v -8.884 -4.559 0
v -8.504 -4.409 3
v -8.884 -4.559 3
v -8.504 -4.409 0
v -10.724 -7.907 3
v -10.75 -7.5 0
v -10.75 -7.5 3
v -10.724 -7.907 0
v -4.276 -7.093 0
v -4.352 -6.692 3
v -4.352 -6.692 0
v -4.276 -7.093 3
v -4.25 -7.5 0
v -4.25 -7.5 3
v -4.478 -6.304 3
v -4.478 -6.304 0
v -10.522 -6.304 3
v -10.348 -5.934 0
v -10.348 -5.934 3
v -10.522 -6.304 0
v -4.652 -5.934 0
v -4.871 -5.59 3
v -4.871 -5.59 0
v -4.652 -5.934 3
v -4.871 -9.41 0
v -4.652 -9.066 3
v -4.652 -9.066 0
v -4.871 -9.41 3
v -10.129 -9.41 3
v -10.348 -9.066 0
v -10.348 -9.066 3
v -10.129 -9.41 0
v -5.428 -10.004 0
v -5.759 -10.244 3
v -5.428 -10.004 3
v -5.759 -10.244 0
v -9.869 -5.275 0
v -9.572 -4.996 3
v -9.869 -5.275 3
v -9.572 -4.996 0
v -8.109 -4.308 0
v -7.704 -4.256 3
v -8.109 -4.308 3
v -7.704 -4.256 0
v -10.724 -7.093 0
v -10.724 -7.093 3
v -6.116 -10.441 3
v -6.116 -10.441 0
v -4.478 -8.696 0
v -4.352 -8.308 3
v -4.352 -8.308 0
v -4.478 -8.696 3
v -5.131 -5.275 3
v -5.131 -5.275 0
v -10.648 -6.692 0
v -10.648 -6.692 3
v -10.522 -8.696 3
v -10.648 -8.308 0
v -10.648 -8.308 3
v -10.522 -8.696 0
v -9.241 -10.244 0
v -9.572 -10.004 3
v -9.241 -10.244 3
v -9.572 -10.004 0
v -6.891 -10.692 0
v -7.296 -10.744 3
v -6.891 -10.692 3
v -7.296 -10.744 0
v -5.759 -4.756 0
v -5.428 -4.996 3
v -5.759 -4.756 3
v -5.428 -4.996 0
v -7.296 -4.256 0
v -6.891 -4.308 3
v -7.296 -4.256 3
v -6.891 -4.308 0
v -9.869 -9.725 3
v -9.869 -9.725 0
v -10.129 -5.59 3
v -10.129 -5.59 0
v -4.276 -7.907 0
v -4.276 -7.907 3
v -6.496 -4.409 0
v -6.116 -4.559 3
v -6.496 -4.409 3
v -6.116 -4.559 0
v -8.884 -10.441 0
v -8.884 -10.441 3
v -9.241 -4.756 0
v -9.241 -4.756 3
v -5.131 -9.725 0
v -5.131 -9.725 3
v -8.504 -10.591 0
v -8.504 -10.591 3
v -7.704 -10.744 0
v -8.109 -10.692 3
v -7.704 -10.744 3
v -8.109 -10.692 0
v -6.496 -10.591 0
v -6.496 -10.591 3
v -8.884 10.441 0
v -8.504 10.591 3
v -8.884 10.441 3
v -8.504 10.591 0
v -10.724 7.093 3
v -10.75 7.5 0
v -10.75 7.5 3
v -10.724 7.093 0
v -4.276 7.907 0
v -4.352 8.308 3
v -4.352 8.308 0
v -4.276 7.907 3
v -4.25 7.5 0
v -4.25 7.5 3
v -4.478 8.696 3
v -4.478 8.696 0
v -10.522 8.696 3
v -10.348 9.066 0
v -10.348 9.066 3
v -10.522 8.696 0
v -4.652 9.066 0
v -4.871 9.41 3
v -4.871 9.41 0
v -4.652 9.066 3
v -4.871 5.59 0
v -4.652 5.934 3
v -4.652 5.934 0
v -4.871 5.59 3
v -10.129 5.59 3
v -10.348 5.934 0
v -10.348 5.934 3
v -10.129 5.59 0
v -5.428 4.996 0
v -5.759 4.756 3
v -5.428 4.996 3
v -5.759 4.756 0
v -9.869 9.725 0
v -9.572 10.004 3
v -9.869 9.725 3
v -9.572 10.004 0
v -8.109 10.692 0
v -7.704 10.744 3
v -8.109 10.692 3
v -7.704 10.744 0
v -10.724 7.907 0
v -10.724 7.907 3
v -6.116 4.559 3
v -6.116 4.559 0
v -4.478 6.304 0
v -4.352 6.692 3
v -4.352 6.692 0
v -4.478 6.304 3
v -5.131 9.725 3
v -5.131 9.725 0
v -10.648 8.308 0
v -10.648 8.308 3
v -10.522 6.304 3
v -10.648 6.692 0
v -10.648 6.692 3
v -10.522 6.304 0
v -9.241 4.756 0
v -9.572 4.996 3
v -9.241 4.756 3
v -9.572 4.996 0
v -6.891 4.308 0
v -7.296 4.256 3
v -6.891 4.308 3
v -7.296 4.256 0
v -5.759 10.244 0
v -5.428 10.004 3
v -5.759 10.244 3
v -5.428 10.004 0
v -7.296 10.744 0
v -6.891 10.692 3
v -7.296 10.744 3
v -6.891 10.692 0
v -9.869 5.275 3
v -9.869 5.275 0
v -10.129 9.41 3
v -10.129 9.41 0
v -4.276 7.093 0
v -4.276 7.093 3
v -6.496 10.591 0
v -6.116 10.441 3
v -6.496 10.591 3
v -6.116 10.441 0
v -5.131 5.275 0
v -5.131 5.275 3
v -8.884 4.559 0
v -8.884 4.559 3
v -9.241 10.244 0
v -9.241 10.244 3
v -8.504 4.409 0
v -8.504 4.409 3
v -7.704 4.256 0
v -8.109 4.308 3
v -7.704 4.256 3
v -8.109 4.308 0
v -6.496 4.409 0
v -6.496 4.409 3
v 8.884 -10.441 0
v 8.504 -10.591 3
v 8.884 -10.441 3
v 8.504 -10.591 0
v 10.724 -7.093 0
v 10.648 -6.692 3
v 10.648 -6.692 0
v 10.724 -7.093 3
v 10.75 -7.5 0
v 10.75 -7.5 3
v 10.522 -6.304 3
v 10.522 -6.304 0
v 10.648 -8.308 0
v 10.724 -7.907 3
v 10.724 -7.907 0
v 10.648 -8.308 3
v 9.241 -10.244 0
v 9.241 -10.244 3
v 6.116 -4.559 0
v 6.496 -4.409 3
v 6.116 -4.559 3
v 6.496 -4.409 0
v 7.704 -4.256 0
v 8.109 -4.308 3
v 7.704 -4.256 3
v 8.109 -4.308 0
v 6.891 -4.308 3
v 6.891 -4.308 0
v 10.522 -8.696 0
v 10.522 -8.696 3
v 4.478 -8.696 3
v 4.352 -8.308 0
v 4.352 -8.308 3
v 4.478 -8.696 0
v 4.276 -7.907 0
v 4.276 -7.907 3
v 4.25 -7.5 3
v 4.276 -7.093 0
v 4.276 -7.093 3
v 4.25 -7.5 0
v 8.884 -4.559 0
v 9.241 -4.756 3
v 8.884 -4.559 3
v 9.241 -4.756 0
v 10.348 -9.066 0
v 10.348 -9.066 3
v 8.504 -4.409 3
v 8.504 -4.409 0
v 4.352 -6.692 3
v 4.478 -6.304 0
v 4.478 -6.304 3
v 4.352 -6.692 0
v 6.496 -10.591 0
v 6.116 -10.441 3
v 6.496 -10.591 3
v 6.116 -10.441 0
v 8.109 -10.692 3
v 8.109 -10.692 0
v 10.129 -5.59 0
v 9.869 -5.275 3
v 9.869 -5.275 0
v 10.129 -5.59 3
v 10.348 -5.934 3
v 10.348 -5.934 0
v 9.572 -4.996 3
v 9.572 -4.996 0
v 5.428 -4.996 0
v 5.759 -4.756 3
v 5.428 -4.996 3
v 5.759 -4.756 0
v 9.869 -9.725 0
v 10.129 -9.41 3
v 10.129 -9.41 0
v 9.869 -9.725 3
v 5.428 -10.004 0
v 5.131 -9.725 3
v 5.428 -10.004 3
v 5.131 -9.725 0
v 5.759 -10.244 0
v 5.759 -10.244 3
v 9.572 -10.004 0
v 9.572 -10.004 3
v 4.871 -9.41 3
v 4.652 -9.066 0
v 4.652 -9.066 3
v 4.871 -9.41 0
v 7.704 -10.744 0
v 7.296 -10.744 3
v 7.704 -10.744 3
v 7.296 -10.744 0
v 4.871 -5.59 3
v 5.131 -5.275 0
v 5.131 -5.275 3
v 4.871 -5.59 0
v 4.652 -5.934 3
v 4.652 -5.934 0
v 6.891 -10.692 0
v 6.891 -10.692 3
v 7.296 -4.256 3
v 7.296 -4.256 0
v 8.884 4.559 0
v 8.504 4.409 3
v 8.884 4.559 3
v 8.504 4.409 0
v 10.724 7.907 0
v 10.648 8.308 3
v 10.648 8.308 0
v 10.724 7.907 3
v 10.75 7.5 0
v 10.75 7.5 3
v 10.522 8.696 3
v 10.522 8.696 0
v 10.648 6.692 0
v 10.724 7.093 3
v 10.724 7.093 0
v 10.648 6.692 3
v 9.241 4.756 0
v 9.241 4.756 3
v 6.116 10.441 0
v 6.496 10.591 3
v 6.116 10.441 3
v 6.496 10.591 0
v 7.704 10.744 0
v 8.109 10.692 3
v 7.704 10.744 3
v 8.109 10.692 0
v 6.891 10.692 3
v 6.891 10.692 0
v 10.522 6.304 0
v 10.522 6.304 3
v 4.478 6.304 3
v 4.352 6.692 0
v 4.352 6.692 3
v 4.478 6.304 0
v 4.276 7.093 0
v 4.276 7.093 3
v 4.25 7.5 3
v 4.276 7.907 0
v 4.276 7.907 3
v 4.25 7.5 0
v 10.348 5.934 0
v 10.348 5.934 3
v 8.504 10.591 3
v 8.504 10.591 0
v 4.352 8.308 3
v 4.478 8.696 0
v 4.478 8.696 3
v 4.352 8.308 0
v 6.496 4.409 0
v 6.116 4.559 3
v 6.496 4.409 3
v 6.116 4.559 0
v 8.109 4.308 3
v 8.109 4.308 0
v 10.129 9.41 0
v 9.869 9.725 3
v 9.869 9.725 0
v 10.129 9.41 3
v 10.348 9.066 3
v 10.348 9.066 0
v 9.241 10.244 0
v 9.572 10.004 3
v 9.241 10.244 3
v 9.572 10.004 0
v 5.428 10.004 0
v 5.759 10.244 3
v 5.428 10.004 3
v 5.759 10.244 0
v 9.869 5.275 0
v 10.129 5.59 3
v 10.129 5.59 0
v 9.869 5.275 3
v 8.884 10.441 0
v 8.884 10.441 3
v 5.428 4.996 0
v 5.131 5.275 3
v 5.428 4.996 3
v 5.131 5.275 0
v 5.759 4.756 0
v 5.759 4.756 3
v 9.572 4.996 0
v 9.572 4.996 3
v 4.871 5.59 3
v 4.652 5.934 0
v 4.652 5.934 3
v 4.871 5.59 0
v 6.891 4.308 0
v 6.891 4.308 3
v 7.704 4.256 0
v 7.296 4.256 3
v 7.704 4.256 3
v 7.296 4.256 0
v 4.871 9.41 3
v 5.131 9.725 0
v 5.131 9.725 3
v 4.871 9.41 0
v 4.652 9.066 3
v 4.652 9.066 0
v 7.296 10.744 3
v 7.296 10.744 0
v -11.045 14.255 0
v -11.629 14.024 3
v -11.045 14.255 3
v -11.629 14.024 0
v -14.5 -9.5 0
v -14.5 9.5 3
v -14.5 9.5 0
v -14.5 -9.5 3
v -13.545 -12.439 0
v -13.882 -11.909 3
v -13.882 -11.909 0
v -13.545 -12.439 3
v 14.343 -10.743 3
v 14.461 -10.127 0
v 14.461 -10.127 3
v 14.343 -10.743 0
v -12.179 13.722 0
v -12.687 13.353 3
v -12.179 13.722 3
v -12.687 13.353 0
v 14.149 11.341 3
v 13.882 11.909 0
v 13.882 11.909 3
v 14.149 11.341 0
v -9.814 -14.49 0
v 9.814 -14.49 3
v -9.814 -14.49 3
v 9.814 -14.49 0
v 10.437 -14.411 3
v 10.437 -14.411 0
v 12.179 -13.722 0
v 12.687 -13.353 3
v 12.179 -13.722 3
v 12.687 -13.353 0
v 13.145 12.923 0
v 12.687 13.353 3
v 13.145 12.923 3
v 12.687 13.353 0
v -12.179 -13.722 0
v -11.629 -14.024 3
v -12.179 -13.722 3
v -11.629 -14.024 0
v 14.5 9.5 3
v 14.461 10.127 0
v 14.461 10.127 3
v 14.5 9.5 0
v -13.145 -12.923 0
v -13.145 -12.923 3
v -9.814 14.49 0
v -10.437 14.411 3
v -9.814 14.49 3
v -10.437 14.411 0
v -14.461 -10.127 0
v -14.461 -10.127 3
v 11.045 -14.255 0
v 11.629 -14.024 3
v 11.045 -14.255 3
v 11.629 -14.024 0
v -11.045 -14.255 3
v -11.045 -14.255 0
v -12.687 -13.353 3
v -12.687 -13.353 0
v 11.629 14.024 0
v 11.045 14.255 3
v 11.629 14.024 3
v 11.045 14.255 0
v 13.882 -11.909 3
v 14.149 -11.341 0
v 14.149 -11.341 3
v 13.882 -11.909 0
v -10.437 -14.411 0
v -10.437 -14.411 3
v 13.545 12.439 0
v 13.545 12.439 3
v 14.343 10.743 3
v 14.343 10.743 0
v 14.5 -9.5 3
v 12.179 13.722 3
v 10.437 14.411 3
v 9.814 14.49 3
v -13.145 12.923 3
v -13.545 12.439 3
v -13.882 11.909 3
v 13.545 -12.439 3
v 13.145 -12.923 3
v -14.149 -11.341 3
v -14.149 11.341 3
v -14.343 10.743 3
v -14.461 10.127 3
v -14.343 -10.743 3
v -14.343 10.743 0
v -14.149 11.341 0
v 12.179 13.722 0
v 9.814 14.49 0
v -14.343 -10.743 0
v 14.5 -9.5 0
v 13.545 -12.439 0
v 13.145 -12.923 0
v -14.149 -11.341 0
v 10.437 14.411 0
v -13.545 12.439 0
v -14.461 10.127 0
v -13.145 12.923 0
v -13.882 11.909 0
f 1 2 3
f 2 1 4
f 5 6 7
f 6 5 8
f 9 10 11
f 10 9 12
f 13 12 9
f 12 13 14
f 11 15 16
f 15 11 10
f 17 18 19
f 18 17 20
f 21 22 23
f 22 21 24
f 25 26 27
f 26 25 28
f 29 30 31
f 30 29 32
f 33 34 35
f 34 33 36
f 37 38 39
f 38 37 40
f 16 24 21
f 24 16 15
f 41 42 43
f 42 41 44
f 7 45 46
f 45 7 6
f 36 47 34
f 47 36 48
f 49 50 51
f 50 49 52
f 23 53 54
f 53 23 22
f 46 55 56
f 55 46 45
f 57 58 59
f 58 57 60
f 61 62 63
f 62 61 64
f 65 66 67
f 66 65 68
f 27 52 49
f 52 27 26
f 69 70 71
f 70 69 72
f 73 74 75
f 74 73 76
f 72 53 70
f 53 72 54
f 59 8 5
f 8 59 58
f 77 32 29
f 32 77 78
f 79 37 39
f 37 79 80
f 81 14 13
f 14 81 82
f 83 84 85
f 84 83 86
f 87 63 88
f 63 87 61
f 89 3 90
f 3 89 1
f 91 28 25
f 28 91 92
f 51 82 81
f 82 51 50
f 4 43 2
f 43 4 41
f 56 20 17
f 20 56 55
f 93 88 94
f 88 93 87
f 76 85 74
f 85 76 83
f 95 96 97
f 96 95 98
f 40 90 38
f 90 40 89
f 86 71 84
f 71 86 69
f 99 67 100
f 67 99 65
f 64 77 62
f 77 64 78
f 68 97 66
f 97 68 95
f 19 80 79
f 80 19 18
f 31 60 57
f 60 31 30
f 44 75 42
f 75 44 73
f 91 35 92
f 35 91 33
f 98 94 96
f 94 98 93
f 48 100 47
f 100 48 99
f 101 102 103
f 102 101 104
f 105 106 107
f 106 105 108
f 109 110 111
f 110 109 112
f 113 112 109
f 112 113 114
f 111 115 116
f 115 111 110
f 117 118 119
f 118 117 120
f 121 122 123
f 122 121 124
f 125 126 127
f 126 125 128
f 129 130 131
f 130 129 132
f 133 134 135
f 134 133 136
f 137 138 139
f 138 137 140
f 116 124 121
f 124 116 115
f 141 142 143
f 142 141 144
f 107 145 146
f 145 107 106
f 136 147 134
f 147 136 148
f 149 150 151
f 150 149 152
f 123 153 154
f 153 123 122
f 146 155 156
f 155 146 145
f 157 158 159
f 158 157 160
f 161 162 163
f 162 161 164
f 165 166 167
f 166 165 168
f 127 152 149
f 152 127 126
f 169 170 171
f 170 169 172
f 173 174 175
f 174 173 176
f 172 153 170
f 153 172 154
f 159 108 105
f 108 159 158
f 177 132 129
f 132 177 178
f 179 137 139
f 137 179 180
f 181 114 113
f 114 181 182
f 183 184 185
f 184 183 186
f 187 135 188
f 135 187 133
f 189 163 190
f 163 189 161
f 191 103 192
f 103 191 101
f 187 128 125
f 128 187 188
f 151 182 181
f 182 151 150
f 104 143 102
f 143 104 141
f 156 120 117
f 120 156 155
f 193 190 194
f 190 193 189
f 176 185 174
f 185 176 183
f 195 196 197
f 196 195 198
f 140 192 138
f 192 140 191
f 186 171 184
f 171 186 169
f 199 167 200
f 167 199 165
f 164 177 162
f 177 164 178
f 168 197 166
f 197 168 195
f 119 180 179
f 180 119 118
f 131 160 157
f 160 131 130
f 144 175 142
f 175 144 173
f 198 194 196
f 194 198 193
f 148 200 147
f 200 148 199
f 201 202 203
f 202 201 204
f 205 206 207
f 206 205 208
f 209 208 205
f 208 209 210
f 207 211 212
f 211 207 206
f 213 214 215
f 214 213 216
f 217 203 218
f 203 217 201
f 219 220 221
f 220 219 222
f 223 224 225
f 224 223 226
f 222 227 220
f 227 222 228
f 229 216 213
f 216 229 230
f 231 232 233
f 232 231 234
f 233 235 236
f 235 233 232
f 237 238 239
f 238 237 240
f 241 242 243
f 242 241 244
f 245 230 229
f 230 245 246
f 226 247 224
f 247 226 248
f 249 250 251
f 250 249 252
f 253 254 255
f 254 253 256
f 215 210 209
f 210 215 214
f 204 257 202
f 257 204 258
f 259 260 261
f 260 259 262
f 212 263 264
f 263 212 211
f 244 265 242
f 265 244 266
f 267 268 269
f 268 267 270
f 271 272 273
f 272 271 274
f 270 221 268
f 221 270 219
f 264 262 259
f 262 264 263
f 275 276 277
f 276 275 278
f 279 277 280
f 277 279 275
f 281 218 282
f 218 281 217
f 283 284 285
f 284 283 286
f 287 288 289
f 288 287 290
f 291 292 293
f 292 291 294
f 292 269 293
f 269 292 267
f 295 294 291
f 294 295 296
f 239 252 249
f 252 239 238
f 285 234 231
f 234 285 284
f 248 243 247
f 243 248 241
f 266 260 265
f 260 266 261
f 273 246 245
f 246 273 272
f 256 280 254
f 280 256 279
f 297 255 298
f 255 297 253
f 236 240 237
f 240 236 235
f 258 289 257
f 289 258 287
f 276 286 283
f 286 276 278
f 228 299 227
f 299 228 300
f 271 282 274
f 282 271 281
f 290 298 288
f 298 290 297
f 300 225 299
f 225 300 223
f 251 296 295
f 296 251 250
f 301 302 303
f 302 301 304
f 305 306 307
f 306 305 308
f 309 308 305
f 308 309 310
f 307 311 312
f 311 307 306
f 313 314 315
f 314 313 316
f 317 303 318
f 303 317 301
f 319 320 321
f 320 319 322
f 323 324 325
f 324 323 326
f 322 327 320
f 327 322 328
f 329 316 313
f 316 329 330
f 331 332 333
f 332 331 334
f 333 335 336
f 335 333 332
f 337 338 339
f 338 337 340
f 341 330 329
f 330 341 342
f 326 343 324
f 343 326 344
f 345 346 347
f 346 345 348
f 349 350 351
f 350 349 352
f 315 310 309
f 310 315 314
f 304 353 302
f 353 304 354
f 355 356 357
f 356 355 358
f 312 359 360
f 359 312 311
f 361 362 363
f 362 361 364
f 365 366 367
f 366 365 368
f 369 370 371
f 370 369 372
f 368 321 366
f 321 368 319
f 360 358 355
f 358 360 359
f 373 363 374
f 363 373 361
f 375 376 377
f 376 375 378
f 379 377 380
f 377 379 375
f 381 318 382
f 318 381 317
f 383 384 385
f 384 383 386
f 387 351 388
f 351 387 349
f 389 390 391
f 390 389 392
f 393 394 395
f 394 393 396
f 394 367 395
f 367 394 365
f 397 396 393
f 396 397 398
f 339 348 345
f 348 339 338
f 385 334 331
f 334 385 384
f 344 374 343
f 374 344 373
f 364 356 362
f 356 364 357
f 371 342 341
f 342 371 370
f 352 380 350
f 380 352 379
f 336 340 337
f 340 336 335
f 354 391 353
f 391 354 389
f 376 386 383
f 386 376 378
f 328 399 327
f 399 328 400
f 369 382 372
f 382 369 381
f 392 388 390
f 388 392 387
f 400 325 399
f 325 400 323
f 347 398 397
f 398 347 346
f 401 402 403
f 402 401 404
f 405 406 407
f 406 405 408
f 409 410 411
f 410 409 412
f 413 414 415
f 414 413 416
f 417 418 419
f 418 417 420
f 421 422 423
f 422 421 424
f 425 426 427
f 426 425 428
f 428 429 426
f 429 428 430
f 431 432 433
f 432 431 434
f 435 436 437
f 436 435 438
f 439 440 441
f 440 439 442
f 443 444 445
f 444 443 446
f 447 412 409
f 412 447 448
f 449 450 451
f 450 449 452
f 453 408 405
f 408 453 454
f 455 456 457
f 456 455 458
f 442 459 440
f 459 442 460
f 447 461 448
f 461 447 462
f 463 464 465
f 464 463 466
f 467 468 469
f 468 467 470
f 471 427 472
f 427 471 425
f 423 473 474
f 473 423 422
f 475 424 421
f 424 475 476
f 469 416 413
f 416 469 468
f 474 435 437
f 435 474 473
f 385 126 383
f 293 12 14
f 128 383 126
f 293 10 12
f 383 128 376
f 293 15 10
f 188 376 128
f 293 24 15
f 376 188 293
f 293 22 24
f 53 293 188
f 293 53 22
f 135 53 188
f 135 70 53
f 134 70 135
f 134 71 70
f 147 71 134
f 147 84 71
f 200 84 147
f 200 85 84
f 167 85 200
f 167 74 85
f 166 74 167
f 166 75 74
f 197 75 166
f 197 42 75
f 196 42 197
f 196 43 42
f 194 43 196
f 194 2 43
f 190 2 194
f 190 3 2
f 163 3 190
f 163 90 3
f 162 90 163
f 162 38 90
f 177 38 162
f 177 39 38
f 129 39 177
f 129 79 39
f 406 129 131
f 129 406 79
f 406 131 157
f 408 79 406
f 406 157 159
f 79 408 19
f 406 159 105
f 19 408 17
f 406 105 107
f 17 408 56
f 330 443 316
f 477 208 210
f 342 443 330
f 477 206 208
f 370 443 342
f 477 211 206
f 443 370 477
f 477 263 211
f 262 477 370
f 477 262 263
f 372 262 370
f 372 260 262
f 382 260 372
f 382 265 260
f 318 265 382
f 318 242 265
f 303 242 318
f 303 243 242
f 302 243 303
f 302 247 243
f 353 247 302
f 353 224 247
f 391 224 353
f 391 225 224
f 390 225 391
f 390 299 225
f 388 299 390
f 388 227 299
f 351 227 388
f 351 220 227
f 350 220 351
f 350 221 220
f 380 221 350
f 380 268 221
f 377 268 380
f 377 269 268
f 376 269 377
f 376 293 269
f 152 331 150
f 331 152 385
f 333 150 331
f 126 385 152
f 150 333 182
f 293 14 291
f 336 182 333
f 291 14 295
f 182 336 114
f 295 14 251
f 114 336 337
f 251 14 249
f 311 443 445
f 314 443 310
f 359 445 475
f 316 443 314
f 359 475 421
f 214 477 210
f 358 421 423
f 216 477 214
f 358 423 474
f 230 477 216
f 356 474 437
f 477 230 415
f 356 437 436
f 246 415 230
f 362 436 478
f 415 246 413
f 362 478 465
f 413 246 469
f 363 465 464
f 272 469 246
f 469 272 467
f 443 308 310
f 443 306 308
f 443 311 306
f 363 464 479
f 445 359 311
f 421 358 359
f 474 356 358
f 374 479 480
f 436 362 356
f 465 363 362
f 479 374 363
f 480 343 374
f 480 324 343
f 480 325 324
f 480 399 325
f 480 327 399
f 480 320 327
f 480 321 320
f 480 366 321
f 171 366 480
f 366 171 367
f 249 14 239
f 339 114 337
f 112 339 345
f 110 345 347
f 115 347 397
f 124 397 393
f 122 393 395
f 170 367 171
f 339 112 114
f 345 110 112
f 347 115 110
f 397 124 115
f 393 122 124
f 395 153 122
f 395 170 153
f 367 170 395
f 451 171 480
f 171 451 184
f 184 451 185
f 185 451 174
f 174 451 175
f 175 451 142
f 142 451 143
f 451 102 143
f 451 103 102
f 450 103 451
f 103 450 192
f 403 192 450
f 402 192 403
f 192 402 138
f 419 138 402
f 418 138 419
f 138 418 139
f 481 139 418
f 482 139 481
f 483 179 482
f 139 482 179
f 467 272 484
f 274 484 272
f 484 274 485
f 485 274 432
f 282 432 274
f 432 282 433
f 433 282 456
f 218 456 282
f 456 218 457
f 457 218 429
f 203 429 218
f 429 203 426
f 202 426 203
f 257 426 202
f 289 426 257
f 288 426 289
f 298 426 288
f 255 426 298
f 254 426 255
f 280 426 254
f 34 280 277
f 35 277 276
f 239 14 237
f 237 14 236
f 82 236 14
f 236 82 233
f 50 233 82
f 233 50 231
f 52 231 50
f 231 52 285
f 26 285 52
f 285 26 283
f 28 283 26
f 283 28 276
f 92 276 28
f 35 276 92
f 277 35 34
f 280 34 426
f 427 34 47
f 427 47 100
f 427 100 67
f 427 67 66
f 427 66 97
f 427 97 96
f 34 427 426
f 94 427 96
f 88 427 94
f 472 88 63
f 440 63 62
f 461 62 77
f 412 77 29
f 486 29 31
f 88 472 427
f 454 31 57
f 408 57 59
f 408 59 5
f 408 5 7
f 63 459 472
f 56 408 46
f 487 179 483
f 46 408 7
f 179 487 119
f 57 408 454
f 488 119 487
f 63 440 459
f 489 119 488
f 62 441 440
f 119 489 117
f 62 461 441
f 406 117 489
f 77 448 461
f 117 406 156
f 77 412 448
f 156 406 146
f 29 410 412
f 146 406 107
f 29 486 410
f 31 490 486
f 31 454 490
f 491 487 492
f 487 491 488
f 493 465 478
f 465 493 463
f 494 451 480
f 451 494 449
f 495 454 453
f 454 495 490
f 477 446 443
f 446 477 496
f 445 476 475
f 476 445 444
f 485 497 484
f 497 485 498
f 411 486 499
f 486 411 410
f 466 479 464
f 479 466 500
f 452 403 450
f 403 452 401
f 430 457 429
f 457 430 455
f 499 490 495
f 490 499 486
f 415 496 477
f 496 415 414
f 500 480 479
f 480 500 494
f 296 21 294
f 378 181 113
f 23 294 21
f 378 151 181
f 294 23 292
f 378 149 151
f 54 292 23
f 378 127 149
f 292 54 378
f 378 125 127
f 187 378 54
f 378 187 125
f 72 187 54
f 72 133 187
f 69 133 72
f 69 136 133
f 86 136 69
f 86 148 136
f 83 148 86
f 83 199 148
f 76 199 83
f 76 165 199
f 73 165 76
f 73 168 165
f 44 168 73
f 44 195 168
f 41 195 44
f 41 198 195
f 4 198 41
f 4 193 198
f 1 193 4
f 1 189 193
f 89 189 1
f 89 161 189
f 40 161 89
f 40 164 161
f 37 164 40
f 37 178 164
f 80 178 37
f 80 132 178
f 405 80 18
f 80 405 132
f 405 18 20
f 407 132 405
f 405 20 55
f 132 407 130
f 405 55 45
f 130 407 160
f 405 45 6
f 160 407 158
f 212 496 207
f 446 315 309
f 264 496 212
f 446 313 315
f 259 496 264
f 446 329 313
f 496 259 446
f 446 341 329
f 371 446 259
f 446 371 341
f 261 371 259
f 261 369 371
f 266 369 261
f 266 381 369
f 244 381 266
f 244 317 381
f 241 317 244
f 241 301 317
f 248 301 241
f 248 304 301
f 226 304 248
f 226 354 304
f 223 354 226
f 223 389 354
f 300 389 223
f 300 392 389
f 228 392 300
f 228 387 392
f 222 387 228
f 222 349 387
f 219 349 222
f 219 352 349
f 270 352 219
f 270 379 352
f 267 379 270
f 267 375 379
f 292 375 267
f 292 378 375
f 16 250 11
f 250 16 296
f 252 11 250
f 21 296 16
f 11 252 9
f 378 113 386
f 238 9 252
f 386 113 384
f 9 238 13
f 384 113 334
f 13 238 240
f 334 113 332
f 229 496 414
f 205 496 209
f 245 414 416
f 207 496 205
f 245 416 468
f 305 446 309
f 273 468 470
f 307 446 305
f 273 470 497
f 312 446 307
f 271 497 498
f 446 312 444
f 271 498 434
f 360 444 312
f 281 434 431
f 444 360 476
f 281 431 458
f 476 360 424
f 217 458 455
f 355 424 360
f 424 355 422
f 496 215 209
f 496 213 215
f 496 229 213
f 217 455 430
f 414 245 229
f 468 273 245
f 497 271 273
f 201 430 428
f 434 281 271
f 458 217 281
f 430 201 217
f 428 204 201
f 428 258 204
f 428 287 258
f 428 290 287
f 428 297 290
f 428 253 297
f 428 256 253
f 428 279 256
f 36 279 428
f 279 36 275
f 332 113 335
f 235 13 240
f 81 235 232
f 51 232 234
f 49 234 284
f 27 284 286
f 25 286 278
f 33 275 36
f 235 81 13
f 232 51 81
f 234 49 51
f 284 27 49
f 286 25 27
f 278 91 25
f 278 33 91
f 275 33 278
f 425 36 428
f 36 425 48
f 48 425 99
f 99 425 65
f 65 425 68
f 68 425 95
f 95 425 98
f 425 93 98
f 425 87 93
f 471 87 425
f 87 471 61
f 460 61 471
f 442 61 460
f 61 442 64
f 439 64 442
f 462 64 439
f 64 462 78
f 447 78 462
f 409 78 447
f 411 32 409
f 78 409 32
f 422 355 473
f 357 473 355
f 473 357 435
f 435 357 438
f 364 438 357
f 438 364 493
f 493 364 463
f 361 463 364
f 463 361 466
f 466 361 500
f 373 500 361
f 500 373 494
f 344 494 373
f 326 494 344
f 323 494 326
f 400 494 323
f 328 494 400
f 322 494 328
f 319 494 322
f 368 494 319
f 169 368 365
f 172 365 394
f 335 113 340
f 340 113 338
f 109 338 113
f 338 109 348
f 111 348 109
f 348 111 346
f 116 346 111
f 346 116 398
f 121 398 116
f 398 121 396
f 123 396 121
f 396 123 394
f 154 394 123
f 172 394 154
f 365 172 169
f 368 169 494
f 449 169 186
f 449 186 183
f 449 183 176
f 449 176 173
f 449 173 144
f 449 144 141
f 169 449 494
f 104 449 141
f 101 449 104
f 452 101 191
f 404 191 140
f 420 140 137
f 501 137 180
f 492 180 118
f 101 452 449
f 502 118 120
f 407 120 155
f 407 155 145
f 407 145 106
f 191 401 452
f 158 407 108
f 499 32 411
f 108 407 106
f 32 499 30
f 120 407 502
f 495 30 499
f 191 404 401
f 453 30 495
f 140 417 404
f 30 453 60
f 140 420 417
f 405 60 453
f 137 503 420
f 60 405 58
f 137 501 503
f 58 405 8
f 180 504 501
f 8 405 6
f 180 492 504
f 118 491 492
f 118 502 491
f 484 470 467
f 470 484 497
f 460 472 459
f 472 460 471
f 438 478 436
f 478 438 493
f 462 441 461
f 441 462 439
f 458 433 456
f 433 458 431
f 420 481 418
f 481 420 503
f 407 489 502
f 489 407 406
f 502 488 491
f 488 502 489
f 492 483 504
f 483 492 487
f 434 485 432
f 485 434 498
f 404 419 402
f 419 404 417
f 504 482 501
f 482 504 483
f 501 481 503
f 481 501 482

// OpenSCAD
// Generated by SolidPython 1.1.3 on 2023-03-12 21:51:07
$fn = 50;


difference() {
	union() {
		translate(v = [0, 0, 0]) {
			rotate(a = [0, 0, 0]) {
				hull() {
					translate(v = [-9.5000000000, 9.5000000000, 0]) {
						rotate(a = [0, 0, 0]) {
							translate(v = [0, 0, 0]) {
								rotate(a = [0, 0, 0]) {
									cylinder(h = 3, r = 5);
								}
							}
						}
					}
					translate(v = [9.5000000000, 9.5000000000, 0]) {
						rotate(a = [0, 0, 0]) {
							translate(v = [0, 0, 0]) {
								rotate(a = [0, 0, 0]) {
									cylinder(h = 3, r = 5);
								}
							}
						}
					}
					translate(v = [-9.5000000000, -9.5000000000, 0]) {
						rotate(a = [0, 0, 0]) {
							translate(v = [0, 0, 0]) {
								rotate(a = [0, 0, 0]) {
									cylinder(h = 3, r = 5);
								}
							}
						}
					}
					translate(v = [9.5000000000, -9.5000000000, 0]) {
						rotate(a = [0, 0, 0]) {
							translate(v = [0, 0, 0]) {
								rotate(a = [0, 0, 0]) {
									cylinder(h = 3, r = 5);
								}
							}
						}
					}
				}
			}
		}
	}
	union() {
		translate(v = [-7.5000000000, -7.5000000000, 0]) {
			rotate(a = [0, 0, 0]) {
				translate(v = [0, 0, -50]) {
					rotate(a = [0, 0, 0]) {
						cylinder(h = 100, r = 3.2500000000);
					}
				}
			}
		}
		translate(v = [-7.5000000000, 7.5000000000, 0]) {
			rotate(a = [0, 0, 0]) {
				translate(v = [0, 0, -50]) {
					rotate(a = [0, 0, 0]) {
						cylinder(h = 100, r = 3.2500000000);
					}
				}
			}
		}
		translate(v = [7.5000000000, -7.5000000000, 0]) {
			rotate(a = [0, 0, 0]) {
				translate(v = [0, 0, -50]) {
					rotate(a = [0, 0, 0]) {
						cylinder(h = 100, r = 3.2500000000);
					}
				}
			}
		}
		translate(v = [7.5000000000, 7.5000000000, 0]) {
			rotate(a = [0, 0, 0]) {
				translate(v = [0, 0, -50]) {
					rotate(a = [0, 0, 0]) {
						cylinder(h = 100, r = 3.2500000000);
					}
				}
			}
		}
	}
}
/***********************************************
*********      SolidPython code:      **********
************************************************
 
from solid import *
import os
import subprocess

import oomB

import opsc_library_gen

mode = "laser"
#mode = "3d_print"

defined_objects = {}

radius_dict = {}
countersunk_dict = {}


def set_mode(m):
    global mode
    mode = m
    radius_dict['M6'] = 6.5/2
    radius_dict['M3'] = 3.3/2
    if mode == "laser":
        radius_dict['M6'] = 6/2
        radius_dict['M3'] = 3/2

    countersunk_dict['M3'] = {}
    countersunk_dict['M3']['little_rad'] = radius_dict['M3']
    countersunk_dict['M3']['big_rad'] = (5.5+0.6)/2
    if mode == "laser":
        countersunk_dict['M3']['big_rad'] = (4.75+0.6)/2
        countersunk_dict['M3']['little_rad'] = (4.75+0.6)/2

    countersunk_dict['M3']['height'] = 1.7


def opsc_make_object(filename, objects, save_type="none",resolution=50, layers = 1, tilediff = 200, mode="laser", overwrite=True):
    if overwrite or not os.path.exists(filename):
        set_mode(mode)
        save_type = save_type.lower()
        os.makedirs(os.path.dirname(filename), exist_ok=True)
        final_object = opsc_get_object(objects, mode = mode)
        # Save the final object to the specified filename    
        scad_render_to_file(final_object, filename, file_header='$fn = %s;' % resolution, include_orig_code=True)
        if mode == "laser":
            filename_laser = filename.replace(".scad","-flat.scad")
            scad_render_to_file(getLaser(final_object, layers=layers, tilediff=tilediff), filename_laser, file_header='$fn = %s;' % resolution, include_orig_code=True)
            if save_type == "all":
                saveToAll(filename_laser)
            elif save_type == "dxf":
                saveToDxf(filename_laser)
        if save_type == "all":
            saveToAll(filename)
        elif save_type == "dxf":
            saveToDxf(filename)


def opsc_get_object(objects, mode = "laser"):
    # Create the solidpython objects only include the positive objects and if they don't have inclusion or their inclusion is either all or mode
    # Initialize an empty list to store the results
    positive_objects = []

    # Iterate over the "objects" list
    for obj in objects:
        # Check if the current object has a "type" key with a value of "positive"
        if obj['type'] == 'positive':
            # Check if the current object has an "inclusion" key and its value matches "mode",
            # or if the current object does not have an "inclusion" key at all
            if not 'inclusion' in obj or obj['inclusion'] == "all" or obj['inclusion'] == mode:
                # Call the "get_opsc_item" function with the current object as an argument
                opsc_item = get_opsc_item(obj)
                # Add the result to the "positive_objects" list
                positive_objects.append(opsc_item)
# Initialize an empty list to store the results
    negative_objects = []

    # Iterate over the "objects" list
    for obj in objects:
        # Check if the current object has a "type" key with a value of "negative"
        if obj['type'] == 'negative':
            # Check if the current object has an "inclusion" key and its value matches "mode",
            # or if the current object does not have an "inclusion" key at all
            if not 'inclusion' in obj or obj['inclusion'] == "all" or obj['inclusion'] == mode:
                # Call the "get_opsc_item" function with the current object as an argument
                opsc_item = get_opsc_item(obj)
                # Add the result to the "negative_objects" list
                negative_objects.append(opsc_item)
    
    #positive_objects = [get_opsc_item(obj) for obj in objects if obj['type'] == 'positive']
    #negative_objects = [get_opsc_item(obj) for obj in objects if obj['type'] == 'negative']
    # Union the positive objects
    positive_object = union()(*positive_objects)
    # Union the negative objects
    negative_object = union()(*negative_objects)
    # Create the final object by subtracting the negative objects from the positive objects
    return difference()(positive_object, negative_object)

def get_opsc_item(params):
    # A dictionary to map radius string values to numerical values
    #radius_dict = {'small': 5, 'medium': 10, 'large': 15}
    # An array of function names for basic shapes
    basic_shapes = ['cube', 'sphere', 'cylinder']
    
    # An array of function names for other shapes
    other_shapes = ['hole', 'slot', 'rounded_rectangle', 'countersunk']
    


    # Convert radius to r if present, and remove radius from the params dictionary
    if 'radius' in params:
        if isinstance(params['radius'], str):
            # Use the radius_dict to map the radius string value to a numerical value
            params['r'] = radius_dict[params['radius']]
        else:
            params['r'] = params['radius']
        del params['radius']
    

    # Check if the object type is a basic shape
    if params['shape'] in basic_shapes:
        # Remove shape and unexpected dictionary values
        allowed_keys = {'size', 'r', 'r1', 'r2', 'd', 'h', 'rw', 'rh', 'dw', 'dh'}
        shape_params = {k: v for k, v in params.items() if k in allowed_keys}

        # Call the corresponding function for the shape parameter, using ** notation to pass the shape_params dictionary as keyword arguments
        return get_opsc_transform(params,globals()[params['shape']](**shape_params))
    
    # If the object type is not a basic shape, check if it's a defined object or one of the other shapes
    elif params['shape'] in other_shapes:
        # Call the corresponding function for the shape parameter, passing the params dictionary as an argument
        p2 = copy.deepcopy(params)
        p2["pos"] = [0,0,0]
        return get_opsc_transform(params,globals()[params['shape']](p2))
    
    # If the object is not a basic shape or a defined object, try to import it from a .scad file
    else:
        obj = defined_objects[params['shape']]
        return get_opsc_transform(params,obj)

def get_opsc_transform(params, solid_obj):
    # Rotate the object based on the 'rot' field in the params dictionary, or the 'rotX', 'rotY', and 'rotZ' fields if 'rot' is not present
    rot = params.get('rot', [])
    if rot:
        rotX, rotY, rotZ = rot
    else:
        rotX = params.get('rotX', 0)
        rotY = params.get('rotY', 0)
        rotZ = params.get('rotZ', 0)
    solid_obj = rotate([rotX, rotY, rotZ])(solid_obj)

    # Translate the object based on the 'pos' field in the params dictionary, or the 'x', 'y', and 'z' fields if 'pos' is not present
    pos = params.get('pos', [])
    if pos:
        x, y, z = pos
    else:
        x = params.get('x', 0)
        y = params.get('y', 0)
        z = params.get('z', 0)
    solid_obj = translate([x, y, z])(solid_obj)
    return solid_obj


import random

def opsc_easy_array(type, shape, repeats, pos_start, shift_arr, **kwargs):
    for i in range(0,3):
        repeats.append(1)
        pos_start.append(0)
        shift_arr.append(0)
    return_objects = []

    for x in range(0,repeats[0]):
        for y in range(0,repeats[1]):
            for z in range(0,repeats[2]):
                return_objects.append(opsc_easy(type, shape, pos=[pos_start[0]+x*shift_arr[0],pos_start[1]+y*shift_arr[1],pos_start[2]+z*shift_arr[2]], **kwargs))
    return return_objects                



def opsc_easy(type, shape, **kwargs):
    obj = {
        'type': type,
        'shape': shape
    }
    for param in ['size', 'r', 'r1', 'r2', 'd', 'h', 'rw', 'rh', 'dw', 'dh', 'pos', 'x', 'y', 'z', 'rot', 'rotX', 'rotY', 'rotZ', "w", "inclusion"]:
        if param in kwargs:
            obj[param] = kwargs[param]
    return obj

def hole(params):
    p2 = copy.deepcopy(params)  
    # Check if the radius is a string and replace it with the corresponding value from the dictionary
    if isinstance(p2['r'], str):
        p2['r'] = radius_dict[p2['r']]
    
    # Set the height to 100 if not specified
    if 'h' not in p2:
        p2['h'] = 100
        p2["pos"] = [0,0,-50]
    p2["center"] = True
    # Create the cylinder object
    p2["shape"] = "cylinder"
    p2["type"] = "positive"

    return get_opsc_item(p2)

import copy

def countersunk(params):
    p2 = copy.deepcopy(params)
    counter_rad = p2['r']
    p2['r'] = radius_dict[p2['r']]
    hp = copy.deepcopy(p2)
    hp["type"] = "positive"
    hp["shape"] = "hole"
    del hp["rot"]
    hol = get_opsc_item(hp)
    
    cp = copy.deepcopy(p2)
    cp["h"] = countersunk_dict[counter_rad]["height"]
    cp["r2"] = countersunk_dict[counter_rad]["little_rad"]
    cp["r1"] = countersunk_dict[counter_rad]["big_rad"]
    del cp["r"]
    del cp["rot"]
    cp["type"] = "positive"
    cp["shape"] = "cylinder"
    cp["pos"] = [0,0,0]

    top = get_opsc_item(cp)
    return union()(hol,top)



def slot(params):  
    p2 = copy.deepcopy(params) 
    if isinstance(p2['r'], str):
        p2['r'] = radius_dict[p2['r']]
    p2["type"] = "positive"
    p2["shape"] = "hole"
    del p2["rot"]
    p2["pos"] = [0,0,0]
    left = copy.deepcopy(p2)
    right = copy.deepcopy(p2)
    left["pos"][0] = p2["w"] / 2 - p2["r"] 
    
    right["pos"][0] = -p2["w"] / 2 + p2["r"] 
    pass
    leftObj = get_opsc_item(left)
    rightObj = get_opsc_item(right)
    return hull()(leftObj, rightObj)

def rounded_rectangle(params):   
    p2 = copy.deepcopy(params) 
    p2["h"] = p2["size"][2]
    p2["pos"] = p2.get("pos", [0, 0, 0]) 
    p2["type"] = "positive"
    p2["shape"] = "hole"
    p2["pos"] = [0,0,0]
    
    if 'rot' in p2:
        del p2["rot"]   
    if 'r' not in p2:
        p2["r"] = 5 
    tl = copy.deepcopy(p2)
    tr = copy.deepcopy(p2)
    bl = copy.deepcopy(p2)
    br = copy.deepcopy(p2)
    tl["pos"][0] = -(p2["size"][0] - p2["r"]*2)/2
    tl["pos"][1] = (p2["size"][1] - p2["r"]*2)/2
    tr["pos"][0] = (p2["size"][0] - p2["r"]*2)/2
    tr["pos"][1] = (p2["size"][1] - p2["r"]*2)/2
    bl["pos"][0] = -(p2["size"][0] - p2["r"]*2)/2
    bl["pos"][1] = -(p2["size"][1] - p2["r"]*2)/2
    br["pos"][0] = (p2["size"][0] - p2["r"]*2)/2
    br["pos"][1] = -(p2["size"][1] - p2["r"]*2)/2
    del tl["size"]
    del tr["size"]
    del bl["size"]
    del br["size"]
    tlo = get_opsc_item(tl)
    tro = get_opsc_item(tr)
    blo = get_opsc_item(bl)
    bro = get_opsc_item(br)    
    return hull()(tlo, tro, blo, bro)



def import_scad_object(filename):
    # Import the .scad file and convert it to a solidpython object
    #filename = "parts"
    obj = import_scad(filename)
    return obj.main()
    


import os
import solid as solidpython

# A dictionary to store the defined objects


def load_scad_objects():
    opsc_library_gen.gen_library(defined_objects)

import random

def test(num_objects):
    objects = []
    for i in range(num_objects):
        # Choose a random shape
        #shape = random.choice(['cube', 'sphere', 'cylinder', 'hole', 'slot', "rounded_rectangle"])
        shape = random.choice(["rounded_rectangle"])

        # Choose a random type
        type = random.choice(['positive', 'negative'])
        
        # Create an empty object dictionary
        obj = {'shape': shape, 'type': type}
        
        # Set shape-specific parameters
        if obj['shape'] in ['cube']:
            obj['size'] =  [random.uniform(5, 15), random.uniform(5, 15), random.uniform(5, 15)]
        if obj['shape'] in ['rounded_rectangle']:
            obj['size'] =  [random.uniform(5, 15), random.uniform(5, 15), random.uniform(5, 15)]
            obj['r'] = random.uniform(0.5, 5)
        elif obj['shape'] == 'sphere':
            obj['r'] = random.uniform(5, 15)
        elif obj['shape'] in ['cylinder', 'hole']:
            obj['r'] = random.uniform(0.5, 5)
            obj['h'] = random.uniform(5, 15)
        elif obj['shape'] == 'slot':
            obj['r'] = random.uniform(0.5, 5)
            obj['h'] = random.uniform(5, 15)
            obj['w'] = random.uniform(5, 15)
        
        # Set a random position and rotation
        obj['pos'] = [random.uniform(-20, 20), random.uniform(-20, 20), random.uniform(-20, 20)]
        obj['rot'] = [random.uniform(-180, 180), random.uniform(-180, 180), random.uniform(-180, 180)]
        
        # Add the object to the list
        objects.append(obj)
    return objects

####### old file saving
def saveToAll(fileIn):
    saveToDxf(fileIn)
    saveToPng(fileIn)
    saveToStl(fileIn)
    saveToSvg(fileIn)

def saveToDxf(fileIn, fileOut="", copy_to_laser=True):
    if fileOut == "":
        fileOut = fileIn.replace(".scad",".dxf")
    saveToFile(fileIn, fileOut)


    
def saveToPng(fileIn, fileOut="",extra="--render"):
    if fileOut == "":
        fileOut = fileIn.replace(".scad",".png")
    saveToFile(fileIn, fileOut)

def saveToStl(fileIn, fileOut=""):
    if fileOut == "":
        fileOut = fileIn.replace(".scad",".stl")
    saveToFile(fileIn, fileOut)
    
def saveToSvg(fileIn, fileOut=""):
    if fileOut == "":
        fileOut = fileIn.replace(".scad",".svg")
    saveToFile(fileIn, fileOut)

def saveToFile(fileIn, fileOut,extra=""):
    #extra = extra + " --colorscheme Tomorrow"

    launchStr = 'openscad -o "' + fileOut + '"' + extra + ' "' + fileIn + '"'
    if ".png" in fileOut:
        launchStr = launchStr + " --render"
    print("            saveToFile launch string: " + launchStr)
    subprocess.run(launchStr)
    x=0

def getLaser(final_object,start=1.5,layers=1,thickness=3,tilediff=200):
        rv= []

        for x in range(layers):
            rv.append(translate([0,x*tilediff,0])(
                    projection()(
                        intersection()(translate([-500,-500,start+x*thickness])(cube(size=[1000,1000,0.1])),
                            final_object
                        )
                    )
            )
            )
            
        return union()(rv)

set_mode("laser")
load_scad_objects() 
 
************************************************/
